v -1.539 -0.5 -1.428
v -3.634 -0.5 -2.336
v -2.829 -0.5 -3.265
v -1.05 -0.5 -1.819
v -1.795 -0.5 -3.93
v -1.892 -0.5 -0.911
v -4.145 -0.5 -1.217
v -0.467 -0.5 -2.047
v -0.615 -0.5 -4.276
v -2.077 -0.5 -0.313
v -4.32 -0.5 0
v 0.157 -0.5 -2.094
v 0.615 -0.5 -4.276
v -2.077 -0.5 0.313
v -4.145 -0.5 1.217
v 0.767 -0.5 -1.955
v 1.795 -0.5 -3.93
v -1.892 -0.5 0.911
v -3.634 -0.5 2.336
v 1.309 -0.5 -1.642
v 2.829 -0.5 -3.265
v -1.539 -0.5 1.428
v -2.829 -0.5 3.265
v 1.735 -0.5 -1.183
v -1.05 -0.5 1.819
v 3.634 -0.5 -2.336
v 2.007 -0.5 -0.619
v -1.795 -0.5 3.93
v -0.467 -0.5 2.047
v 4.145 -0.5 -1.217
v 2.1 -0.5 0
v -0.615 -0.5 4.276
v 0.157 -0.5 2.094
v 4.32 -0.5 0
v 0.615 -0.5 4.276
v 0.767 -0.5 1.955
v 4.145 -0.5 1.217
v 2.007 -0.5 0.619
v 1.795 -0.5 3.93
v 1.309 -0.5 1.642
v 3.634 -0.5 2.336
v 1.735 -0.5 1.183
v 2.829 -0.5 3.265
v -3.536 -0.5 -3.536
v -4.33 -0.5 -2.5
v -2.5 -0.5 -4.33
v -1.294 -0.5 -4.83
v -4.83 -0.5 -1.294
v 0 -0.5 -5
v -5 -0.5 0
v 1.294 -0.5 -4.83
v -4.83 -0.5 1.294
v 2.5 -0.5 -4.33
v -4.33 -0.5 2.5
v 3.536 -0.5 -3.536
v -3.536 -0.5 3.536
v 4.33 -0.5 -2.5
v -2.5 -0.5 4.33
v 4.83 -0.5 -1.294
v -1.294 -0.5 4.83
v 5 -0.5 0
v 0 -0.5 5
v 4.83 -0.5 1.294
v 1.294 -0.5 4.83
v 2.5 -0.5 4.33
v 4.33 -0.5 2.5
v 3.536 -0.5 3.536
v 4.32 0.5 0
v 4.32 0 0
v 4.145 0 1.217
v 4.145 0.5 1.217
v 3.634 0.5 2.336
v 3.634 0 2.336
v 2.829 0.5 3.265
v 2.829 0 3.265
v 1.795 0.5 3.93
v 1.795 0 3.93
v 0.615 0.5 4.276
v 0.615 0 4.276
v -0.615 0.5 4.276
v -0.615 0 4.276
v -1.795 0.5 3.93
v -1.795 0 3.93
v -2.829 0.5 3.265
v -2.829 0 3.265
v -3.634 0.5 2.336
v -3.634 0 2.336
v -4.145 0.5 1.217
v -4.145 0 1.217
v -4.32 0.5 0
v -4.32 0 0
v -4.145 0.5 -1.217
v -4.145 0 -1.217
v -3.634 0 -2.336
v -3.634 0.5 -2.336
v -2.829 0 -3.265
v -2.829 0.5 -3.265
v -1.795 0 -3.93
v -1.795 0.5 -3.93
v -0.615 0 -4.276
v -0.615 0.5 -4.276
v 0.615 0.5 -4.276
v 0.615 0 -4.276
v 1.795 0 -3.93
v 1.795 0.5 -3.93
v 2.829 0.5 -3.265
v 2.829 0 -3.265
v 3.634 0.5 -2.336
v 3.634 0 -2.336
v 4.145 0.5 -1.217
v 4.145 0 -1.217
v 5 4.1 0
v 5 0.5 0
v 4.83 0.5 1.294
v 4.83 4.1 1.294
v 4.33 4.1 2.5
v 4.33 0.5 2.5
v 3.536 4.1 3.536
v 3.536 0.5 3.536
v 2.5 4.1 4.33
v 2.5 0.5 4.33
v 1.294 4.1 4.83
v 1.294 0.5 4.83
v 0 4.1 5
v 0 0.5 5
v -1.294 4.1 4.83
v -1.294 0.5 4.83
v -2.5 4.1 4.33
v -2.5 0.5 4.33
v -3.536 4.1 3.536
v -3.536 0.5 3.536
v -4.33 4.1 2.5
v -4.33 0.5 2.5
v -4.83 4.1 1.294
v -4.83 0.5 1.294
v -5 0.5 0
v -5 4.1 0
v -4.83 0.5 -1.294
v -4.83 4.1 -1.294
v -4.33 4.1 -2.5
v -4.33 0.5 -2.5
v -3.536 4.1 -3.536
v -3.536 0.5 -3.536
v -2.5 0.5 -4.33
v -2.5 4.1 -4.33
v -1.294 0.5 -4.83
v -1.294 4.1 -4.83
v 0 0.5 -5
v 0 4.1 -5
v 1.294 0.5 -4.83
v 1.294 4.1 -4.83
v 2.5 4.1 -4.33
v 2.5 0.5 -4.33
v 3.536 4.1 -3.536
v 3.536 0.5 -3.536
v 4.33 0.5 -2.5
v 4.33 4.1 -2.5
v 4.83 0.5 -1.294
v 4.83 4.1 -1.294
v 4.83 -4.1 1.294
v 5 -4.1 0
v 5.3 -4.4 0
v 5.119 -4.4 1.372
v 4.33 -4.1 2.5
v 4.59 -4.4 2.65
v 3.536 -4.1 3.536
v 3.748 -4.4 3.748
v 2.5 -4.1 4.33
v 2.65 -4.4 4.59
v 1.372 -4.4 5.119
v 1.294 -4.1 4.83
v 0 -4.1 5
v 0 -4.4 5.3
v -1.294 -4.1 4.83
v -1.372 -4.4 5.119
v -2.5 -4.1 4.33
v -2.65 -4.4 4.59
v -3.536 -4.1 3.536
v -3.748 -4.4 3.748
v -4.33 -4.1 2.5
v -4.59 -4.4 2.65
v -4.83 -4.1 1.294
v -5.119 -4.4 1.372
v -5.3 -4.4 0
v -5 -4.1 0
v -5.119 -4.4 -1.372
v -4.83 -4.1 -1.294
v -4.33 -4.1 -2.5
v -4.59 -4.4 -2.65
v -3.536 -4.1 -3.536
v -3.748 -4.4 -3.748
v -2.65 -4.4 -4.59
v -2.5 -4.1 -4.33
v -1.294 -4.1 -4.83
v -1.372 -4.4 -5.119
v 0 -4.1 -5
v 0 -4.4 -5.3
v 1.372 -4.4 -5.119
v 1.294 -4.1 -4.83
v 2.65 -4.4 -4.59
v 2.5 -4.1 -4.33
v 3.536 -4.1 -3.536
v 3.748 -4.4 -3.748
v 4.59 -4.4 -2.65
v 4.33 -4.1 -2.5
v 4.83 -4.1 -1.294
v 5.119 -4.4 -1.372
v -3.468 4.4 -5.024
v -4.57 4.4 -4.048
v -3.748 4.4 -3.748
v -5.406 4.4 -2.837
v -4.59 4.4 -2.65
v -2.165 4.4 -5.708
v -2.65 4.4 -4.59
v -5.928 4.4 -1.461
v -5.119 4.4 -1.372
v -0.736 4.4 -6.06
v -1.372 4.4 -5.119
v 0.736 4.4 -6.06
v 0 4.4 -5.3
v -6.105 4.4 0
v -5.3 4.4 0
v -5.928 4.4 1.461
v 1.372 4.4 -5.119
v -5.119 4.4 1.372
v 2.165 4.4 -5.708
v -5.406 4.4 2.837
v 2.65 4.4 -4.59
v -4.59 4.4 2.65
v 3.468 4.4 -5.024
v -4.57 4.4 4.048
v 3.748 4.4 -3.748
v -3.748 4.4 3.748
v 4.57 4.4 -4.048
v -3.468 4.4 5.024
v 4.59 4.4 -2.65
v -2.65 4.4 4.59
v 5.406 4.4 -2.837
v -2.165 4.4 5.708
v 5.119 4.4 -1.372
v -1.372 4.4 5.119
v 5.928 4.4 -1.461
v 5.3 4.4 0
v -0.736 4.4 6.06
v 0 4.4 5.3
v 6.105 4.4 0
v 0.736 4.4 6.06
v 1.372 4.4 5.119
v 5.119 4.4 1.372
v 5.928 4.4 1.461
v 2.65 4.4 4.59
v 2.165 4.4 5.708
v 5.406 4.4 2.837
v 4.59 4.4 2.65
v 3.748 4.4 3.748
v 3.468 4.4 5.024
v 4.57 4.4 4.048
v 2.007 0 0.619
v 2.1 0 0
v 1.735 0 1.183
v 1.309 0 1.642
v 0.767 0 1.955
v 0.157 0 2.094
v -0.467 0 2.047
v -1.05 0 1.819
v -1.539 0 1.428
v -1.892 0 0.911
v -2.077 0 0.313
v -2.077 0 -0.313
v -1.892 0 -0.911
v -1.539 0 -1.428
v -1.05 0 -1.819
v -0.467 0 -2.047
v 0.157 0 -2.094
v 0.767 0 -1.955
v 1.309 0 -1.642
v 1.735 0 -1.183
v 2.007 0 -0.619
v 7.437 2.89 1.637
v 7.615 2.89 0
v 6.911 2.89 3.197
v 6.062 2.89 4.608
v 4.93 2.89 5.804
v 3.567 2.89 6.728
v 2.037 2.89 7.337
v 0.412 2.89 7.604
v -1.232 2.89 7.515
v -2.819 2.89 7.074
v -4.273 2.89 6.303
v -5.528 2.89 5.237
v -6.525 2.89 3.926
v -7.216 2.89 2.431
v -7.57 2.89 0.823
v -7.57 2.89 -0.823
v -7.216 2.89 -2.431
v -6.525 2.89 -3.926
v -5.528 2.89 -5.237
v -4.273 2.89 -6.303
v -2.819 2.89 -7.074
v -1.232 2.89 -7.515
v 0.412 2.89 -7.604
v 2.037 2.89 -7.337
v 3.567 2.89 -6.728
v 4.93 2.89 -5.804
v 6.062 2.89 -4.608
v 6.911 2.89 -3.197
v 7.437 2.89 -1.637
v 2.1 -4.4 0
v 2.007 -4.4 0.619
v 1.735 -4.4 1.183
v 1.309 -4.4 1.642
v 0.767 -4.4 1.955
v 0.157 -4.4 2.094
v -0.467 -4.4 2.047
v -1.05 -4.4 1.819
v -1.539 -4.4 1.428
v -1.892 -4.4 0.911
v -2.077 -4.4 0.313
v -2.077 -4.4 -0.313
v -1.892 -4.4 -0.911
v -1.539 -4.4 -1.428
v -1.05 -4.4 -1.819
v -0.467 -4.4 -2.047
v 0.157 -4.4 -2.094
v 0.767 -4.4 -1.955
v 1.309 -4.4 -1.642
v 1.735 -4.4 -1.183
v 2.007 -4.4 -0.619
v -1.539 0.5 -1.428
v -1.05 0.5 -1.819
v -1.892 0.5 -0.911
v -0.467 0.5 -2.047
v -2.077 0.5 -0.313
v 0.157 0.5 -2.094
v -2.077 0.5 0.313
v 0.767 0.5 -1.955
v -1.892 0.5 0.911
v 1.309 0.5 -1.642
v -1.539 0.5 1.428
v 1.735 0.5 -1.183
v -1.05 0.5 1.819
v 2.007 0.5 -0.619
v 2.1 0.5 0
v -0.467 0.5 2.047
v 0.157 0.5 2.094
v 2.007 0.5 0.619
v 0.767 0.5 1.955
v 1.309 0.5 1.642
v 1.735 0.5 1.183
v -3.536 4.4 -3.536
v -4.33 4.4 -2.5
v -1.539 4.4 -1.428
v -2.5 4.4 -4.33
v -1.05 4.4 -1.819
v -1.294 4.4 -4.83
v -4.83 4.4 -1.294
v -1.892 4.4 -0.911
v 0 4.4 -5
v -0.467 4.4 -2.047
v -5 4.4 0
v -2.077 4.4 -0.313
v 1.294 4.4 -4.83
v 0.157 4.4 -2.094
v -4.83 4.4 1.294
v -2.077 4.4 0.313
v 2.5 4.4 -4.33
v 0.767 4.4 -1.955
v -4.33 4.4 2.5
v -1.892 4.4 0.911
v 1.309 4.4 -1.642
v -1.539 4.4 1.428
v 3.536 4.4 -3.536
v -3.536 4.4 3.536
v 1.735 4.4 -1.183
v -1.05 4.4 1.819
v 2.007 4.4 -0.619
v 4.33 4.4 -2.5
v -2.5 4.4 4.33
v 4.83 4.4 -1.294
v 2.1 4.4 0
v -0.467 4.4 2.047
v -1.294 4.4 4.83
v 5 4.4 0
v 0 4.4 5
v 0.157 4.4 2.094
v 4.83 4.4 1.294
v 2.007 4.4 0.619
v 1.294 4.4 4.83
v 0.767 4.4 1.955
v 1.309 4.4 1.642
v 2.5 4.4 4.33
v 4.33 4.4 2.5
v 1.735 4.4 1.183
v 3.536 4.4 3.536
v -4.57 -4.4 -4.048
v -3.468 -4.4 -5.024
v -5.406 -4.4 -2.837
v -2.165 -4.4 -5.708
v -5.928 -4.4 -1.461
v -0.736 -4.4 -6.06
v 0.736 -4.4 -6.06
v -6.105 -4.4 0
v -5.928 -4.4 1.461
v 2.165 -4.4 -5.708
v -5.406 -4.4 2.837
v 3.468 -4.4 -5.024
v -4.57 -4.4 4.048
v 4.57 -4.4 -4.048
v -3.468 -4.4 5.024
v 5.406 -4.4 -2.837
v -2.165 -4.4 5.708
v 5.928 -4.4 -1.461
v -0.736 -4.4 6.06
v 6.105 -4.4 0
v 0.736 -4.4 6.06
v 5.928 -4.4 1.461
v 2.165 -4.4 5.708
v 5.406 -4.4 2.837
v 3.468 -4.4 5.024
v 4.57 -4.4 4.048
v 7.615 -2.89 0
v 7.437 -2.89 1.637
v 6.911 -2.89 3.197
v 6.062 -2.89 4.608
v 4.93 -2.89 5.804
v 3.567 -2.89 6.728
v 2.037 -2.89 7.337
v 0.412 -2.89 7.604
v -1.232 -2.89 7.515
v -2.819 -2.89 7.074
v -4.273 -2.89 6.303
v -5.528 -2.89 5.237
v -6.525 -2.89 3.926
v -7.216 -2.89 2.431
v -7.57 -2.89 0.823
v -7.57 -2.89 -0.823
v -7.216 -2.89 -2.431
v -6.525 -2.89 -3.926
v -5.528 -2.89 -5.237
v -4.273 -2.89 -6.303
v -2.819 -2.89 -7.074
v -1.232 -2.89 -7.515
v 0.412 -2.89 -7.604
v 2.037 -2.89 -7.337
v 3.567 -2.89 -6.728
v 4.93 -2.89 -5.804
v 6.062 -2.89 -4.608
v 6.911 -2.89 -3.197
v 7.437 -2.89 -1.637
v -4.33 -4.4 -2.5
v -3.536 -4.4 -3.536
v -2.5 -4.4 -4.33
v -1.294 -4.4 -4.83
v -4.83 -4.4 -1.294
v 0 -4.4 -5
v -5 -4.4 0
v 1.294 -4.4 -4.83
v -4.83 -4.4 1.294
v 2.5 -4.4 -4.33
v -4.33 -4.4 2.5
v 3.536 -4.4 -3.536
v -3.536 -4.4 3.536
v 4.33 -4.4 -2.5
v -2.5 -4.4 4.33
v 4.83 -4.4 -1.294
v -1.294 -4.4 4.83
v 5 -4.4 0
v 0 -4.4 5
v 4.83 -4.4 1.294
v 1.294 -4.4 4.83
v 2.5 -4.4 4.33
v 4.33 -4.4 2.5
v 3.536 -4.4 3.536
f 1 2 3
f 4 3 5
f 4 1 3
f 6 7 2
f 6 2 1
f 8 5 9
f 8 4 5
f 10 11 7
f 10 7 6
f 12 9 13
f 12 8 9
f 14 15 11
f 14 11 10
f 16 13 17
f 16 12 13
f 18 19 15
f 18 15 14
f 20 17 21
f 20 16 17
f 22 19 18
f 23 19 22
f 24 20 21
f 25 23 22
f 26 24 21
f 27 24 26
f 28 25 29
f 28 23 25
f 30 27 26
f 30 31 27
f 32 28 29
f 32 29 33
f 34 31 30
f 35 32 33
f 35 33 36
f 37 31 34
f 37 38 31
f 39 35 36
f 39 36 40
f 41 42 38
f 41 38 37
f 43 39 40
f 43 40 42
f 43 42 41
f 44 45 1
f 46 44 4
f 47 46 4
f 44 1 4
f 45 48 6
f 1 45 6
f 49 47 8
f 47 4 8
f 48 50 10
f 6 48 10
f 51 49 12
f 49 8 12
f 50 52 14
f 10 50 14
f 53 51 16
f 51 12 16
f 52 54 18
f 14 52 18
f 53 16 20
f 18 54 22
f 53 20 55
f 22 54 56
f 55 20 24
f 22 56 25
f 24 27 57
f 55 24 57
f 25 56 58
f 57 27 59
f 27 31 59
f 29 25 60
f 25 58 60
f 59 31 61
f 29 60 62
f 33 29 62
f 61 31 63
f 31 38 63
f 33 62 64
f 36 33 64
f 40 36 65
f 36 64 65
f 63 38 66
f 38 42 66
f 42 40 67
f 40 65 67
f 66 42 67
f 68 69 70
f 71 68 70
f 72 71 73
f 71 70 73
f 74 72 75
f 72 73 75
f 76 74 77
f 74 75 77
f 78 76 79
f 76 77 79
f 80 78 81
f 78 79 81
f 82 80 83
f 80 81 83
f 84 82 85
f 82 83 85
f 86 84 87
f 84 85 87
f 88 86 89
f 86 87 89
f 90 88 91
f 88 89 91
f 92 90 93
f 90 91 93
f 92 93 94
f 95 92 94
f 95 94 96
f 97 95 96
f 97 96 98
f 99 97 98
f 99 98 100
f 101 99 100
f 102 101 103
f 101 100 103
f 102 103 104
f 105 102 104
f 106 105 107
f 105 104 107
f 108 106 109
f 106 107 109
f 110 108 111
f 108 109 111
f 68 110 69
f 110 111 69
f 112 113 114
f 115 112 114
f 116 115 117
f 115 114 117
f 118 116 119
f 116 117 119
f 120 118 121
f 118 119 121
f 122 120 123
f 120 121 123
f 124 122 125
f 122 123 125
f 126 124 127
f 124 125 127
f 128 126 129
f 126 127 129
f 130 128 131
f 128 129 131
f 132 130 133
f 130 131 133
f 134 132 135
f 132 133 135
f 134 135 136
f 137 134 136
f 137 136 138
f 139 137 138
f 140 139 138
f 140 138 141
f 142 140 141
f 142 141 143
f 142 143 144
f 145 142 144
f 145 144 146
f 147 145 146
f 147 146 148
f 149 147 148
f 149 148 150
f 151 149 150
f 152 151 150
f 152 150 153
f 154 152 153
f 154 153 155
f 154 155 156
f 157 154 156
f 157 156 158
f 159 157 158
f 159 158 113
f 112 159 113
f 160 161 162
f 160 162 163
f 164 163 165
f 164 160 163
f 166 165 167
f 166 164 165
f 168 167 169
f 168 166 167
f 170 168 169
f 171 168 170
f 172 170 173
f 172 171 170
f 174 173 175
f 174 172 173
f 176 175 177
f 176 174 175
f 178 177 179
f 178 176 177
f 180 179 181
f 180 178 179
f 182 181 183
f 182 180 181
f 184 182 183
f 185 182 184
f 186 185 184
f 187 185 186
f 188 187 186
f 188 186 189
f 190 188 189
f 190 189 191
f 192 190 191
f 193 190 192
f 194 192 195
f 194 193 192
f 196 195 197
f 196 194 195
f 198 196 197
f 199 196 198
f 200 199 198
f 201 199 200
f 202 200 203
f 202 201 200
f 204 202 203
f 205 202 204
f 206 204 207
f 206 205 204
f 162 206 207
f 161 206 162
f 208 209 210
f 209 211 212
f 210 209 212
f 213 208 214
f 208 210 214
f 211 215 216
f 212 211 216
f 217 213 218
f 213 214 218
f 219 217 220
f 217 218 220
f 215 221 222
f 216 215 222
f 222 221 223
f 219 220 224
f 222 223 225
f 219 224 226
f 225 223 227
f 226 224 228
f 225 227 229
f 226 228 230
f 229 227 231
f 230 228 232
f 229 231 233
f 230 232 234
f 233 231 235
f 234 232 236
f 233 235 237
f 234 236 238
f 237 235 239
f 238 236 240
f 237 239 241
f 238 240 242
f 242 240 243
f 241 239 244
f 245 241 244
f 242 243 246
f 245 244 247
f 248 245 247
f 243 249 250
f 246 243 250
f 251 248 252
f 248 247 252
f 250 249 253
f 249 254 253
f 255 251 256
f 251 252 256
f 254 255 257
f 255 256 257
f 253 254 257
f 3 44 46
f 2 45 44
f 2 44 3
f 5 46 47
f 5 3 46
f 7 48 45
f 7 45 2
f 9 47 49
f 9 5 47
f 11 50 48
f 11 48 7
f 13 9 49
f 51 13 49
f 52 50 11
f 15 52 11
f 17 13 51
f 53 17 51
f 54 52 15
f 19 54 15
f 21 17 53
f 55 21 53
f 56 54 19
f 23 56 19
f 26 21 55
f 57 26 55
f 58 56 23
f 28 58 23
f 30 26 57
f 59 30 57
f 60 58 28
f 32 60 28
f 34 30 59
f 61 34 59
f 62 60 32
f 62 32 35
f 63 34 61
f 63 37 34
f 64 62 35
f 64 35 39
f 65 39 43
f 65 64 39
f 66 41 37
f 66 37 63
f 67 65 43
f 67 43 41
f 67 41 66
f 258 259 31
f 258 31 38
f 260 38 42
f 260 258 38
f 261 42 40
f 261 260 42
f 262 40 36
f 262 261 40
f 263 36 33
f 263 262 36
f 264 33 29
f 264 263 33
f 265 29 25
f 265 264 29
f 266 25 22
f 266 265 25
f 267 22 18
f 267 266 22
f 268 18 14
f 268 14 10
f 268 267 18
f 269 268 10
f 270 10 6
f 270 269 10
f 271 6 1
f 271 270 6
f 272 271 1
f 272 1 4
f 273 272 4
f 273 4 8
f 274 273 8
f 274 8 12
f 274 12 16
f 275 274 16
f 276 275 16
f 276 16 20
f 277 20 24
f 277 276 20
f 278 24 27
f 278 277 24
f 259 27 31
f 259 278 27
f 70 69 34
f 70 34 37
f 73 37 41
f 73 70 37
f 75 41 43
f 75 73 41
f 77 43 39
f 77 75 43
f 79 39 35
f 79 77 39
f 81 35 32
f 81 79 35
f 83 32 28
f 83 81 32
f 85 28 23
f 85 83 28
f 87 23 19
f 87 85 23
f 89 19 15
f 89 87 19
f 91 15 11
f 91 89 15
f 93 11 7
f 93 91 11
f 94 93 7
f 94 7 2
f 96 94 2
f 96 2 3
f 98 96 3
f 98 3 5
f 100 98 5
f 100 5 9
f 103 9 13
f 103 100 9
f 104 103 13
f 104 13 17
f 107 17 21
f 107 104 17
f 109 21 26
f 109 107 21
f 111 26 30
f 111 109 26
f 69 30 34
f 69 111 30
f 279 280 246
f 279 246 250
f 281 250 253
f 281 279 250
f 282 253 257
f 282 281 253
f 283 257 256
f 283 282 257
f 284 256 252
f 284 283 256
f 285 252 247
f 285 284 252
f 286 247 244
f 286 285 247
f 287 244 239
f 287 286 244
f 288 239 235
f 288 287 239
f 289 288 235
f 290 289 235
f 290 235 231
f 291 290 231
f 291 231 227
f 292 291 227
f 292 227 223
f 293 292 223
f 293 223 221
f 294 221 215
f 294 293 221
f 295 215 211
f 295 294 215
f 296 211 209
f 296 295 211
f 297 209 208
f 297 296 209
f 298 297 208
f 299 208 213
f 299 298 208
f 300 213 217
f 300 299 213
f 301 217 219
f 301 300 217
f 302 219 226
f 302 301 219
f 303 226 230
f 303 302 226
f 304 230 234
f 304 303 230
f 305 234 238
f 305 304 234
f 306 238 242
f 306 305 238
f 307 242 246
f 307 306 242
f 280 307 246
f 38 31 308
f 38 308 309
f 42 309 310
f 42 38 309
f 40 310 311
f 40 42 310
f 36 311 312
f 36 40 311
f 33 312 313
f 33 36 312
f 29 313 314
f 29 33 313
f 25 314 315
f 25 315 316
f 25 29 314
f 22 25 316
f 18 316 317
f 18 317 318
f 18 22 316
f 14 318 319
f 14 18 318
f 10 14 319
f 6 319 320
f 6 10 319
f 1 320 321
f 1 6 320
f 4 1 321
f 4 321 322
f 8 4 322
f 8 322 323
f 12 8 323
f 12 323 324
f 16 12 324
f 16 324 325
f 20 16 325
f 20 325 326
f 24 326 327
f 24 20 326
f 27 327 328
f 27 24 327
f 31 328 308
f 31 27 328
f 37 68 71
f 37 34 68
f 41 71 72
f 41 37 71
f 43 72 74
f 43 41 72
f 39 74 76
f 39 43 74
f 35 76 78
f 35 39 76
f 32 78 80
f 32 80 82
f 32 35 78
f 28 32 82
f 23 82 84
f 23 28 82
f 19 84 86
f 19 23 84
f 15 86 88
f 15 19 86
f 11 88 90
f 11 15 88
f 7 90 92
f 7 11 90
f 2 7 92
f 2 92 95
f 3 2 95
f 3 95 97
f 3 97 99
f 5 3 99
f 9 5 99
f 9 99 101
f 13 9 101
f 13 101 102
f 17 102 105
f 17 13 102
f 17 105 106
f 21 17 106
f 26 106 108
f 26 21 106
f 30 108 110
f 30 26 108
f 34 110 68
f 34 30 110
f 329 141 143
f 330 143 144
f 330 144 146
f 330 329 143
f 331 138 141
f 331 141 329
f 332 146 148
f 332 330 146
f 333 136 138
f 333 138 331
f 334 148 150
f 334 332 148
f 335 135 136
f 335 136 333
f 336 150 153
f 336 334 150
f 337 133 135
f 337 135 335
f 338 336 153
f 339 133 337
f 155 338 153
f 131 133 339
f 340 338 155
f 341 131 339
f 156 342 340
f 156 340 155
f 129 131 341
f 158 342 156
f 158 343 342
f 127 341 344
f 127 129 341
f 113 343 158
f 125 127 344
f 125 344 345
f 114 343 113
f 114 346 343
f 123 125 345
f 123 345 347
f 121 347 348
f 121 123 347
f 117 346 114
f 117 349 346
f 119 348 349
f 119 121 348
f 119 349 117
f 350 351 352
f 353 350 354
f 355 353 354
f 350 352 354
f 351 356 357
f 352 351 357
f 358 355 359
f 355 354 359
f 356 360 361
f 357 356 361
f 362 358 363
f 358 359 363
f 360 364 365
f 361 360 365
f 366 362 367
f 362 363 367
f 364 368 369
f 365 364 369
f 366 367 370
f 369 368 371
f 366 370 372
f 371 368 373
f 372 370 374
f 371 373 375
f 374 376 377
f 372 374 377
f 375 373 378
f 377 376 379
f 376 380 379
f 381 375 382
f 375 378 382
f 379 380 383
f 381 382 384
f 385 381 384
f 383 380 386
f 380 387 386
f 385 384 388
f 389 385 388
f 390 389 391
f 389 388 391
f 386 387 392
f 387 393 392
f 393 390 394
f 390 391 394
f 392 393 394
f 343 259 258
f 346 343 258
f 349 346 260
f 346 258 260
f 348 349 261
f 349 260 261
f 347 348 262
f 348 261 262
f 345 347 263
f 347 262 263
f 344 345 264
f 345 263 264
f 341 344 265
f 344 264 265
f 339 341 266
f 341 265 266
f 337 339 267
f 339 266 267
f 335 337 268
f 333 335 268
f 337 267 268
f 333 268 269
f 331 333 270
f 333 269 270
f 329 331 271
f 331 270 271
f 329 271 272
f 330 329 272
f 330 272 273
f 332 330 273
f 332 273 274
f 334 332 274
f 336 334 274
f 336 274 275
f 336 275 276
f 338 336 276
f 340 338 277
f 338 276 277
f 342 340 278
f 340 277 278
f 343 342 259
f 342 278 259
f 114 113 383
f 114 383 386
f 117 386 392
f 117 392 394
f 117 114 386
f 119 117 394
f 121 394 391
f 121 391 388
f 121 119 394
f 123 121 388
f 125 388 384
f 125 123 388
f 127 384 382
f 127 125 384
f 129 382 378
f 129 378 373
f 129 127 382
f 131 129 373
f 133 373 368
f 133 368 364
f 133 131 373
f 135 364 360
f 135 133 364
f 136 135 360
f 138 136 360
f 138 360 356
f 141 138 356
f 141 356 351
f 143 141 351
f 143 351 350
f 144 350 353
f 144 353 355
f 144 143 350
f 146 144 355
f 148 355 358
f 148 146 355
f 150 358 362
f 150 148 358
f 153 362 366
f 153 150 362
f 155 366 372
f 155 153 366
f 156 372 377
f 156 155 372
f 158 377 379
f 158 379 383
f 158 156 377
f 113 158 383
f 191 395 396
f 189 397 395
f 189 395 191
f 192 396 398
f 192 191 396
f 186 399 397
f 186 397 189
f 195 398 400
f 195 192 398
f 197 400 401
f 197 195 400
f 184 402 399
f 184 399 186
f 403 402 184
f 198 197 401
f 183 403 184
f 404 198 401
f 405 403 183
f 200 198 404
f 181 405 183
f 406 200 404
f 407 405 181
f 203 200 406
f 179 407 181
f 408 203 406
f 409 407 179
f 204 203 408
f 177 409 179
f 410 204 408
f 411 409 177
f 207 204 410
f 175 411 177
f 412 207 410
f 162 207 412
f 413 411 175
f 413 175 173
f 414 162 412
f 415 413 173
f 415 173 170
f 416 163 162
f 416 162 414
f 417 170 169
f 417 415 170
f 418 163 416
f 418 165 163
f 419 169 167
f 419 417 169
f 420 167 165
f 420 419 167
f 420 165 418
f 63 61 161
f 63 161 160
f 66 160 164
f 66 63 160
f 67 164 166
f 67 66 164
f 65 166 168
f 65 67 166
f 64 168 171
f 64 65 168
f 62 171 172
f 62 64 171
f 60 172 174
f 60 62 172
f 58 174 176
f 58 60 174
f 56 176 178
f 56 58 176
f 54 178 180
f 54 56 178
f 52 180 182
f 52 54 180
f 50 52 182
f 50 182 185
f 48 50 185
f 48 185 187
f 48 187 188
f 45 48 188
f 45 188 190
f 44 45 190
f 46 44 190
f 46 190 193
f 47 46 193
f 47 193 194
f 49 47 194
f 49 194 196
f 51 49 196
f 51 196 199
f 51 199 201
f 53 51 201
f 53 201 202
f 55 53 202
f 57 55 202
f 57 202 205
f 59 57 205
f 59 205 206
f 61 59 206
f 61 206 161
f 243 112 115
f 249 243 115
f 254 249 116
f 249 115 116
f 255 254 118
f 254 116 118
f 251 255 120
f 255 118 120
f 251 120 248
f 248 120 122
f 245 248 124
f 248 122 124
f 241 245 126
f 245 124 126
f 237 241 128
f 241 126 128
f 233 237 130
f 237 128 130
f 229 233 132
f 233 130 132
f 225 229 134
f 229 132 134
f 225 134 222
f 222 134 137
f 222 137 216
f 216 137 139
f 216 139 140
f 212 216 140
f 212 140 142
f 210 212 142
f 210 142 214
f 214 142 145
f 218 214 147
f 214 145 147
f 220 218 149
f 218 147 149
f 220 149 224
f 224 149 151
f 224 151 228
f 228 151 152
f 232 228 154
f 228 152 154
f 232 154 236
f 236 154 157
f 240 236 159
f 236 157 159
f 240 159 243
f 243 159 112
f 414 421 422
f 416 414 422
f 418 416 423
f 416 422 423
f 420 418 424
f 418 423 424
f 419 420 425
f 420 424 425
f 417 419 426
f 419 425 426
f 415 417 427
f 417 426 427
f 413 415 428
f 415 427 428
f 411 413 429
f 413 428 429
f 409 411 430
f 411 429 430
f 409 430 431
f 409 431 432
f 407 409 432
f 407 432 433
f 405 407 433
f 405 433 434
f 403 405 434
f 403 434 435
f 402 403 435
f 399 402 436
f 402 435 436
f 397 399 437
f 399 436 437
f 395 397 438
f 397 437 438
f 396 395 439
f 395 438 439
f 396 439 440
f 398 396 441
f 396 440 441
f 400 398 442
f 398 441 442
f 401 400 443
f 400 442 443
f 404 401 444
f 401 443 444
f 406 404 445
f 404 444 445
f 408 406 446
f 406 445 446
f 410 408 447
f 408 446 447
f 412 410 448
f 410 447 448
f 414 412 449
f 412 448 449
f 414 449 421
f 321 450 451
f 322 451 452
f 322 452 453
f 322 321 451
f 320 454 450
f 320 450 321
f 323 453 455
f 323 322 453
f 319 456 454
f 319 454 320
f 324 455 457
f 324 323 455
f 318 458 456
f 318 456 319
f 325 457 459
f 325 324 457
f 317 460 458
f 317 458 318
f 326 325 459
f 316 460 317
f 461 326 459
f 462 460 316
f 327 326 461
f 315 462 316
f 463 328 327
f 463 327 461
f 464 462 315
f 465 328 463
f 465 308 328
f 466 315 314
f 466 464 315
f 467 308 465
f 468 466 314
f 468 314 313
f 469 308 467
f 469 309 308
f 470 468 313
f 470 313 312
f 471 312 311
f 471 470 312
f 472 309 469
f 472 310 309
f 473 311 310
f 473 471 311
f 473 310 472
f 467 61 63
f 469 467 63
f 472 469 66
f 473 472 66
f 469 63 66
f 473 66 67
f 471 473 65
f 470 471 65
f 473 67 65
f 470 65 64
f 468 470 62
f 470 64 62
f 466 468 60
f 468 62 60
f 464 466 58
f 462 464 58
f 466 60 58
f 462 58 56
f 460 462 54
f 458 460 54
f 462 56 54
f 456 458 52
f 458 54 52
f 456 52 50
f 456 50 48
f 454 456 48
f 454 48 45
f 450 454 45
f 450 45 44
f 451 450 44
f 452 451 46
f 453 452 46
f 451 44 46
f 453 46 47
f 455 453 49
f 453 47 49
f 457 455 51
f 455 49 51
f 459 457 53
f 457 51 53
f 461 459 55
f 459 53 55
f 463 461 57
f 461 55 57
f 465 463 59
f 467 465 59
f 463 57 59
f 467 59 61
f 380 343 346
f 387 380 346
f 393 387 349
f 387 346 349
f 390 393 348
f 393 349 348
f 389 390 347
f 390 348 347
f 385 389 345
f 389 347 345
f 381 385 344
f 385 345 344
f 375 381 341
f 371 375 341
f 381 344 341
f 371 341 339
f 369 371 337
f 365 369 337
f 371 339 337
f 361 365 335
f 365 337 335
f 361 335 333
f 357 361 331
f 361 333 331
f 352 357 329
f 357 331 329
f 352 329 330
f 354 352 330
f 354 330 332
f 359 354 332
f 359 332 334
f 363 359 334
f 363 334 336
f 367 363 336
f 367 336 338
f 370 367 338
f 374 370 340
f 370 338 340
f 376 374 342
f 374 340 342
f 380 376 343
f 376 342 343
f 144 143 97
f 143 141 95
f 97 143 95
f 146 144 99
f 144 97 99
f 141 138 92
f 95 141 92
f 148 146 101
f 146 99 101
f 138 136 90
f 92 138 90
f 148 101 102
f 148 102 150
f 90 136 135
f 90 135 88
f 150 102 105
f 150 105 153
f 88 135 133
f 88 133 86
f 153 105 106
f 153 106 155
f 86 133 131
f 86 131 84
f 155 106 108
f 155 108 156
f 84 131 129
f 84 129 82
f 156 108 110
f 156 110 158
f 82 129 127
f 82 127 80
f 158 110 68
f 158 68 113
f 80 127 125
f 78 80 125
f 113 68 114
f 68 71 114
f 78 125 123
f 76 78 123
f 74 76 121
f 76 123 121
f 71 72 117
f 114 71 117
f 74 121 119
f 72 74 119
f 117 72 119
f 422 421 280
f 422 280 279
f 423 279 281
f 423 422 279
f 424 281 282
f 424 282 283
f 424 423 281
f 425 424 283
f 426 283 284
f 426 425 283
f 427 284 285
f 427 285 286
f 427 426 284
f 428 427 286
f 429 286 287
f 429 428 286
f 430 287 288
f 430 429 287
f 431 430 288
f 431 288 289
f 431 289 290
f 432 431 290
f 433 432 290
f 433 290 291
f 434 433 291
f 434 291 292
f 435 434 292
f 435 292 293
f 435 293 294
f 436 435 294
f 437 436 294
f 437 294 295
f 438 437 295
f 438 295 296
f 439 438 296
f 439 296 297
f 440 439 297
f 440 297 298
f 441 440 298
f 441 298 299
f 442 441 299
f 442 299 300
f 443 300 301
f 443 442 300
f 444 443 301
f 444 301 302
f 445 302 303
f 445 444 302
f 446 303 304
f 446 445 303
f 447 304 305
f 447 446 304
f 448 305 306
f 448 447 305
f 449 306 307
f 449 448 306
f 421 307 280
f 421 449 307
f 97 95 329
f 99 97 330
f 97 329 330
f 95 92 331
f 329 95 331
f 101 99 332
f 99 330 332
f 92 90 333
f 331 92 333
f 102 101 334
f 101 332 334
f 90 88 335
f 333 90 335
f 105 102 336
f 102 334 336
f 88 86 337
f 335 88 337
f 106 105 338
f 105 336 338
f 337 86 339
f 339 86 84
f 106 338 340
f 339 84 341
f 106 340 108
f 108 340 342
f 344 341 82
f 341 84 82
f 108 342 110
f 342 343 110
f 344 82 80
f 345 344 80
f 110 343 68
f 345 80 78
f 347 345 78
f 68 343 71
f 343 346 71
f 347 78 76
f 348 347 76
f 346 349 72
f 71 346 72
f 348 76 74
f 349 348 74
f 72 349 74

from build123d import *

# Parameters (mm, degrees)
F0_R          = 7.615
F0_R_2        = 5
F1_DEPTH      = 4.4
F1_DEPTH_BACK = 4.4
F0_R_3        = 4.32
F2_DEPTH      = 0.5
F2_DEPTH_BACK = 0.5
F3_SIZE       = 1.51
F4_SIZE       = 0.3
F5_START      = 0.5
F0_R_4        = 2.1
F5_DEPTH      = 3.9
F6_START      = -0.5
F6_DEPTH      = 3.9
F7_DEPTH      = 0.5
F7_DEPTH_BACK = 0.5


with BuildPart() as f1:
    # F0 (on Front) → F1 (new body, two sides)
    with BuildSketch(Plane.XZ) as f1_sk:
        Circle(F0_R)
        Circle(F0_R_2, mode=Mode.SUBTRACT)
    extrude(amount=F1_DEPTH)
    extrude(f1_sk.sketch, amount=-F1_DEPTH_BACK)

    # F0 (on Front) → F2 (join, two sides)
    with BuildSketch(Plane.XZ) as f2_sk:
        Circle(F0_R_2)
        Circle(F0_R_3, mode=Mode.SUBTRACT)
    extrude(amount=F2_DEPTH)
    extrude(f2_sk.sketch, amount=-F2_DEPTH_BACK)

    # F3
    f3_edges = [f1.edges().sort_by_distance(p)[0] for p in [
        (-7.615, 4.4, 0),
        (-7.615, -4.4, 0),
    ]]
    chamfer(f3_edges, length=F3_SIZE)

    # F4
    f4_edges = [f1.edges().sort_by_distance(p)[0] for p in [
        (-5, -4.4, 0),
        (-5, 4.4, 0),
    ]]
    chamfer(f4_edges, length=F4_SIZE)


with BuildPart() as f5:
    # F0 (on Front) → F5 (new body)
    with BuildSketch(Plane.XZ.offset(F5_START)):
        Circle(F0_R_2)
        Circle(F0_R_3, mode=Mode.SUBTRACT)
        Circle(F0_R_3)
        Circle(F0_R_4, mode=Mode.SUBTRACT)
    extrude(amount=F5_DEPTH)


with BuildPart() as f6:
    # F0 (on Front) → F6 (new body)
    with BuildSketch(Plane.XZ.offset(F6_START)):
        Circle(F0_R_2)
        Circle(F0_R_3, mode=Mode.SUBTRACT)
        Circle(F0_R_3)
        Circle(F0_R_4, mode=Mode.SUBTRACT)
    extrude(amount=-F6_DEPTH)


with BuildPart() as f7:
    # F0 (on Front) → F7 (new body, two sides)
    with BuildSketch(Plane.XZ) as f7_sk:
        Circle(F0_R_3)
        Circle(F0_R_4, mode=Mode.SUBTRACT)
    extrude(amount=F7_DEPTH)
    extrude(f7_sk.sketch, amount=-F7_DEPTH_BACK)


solid = Compound([f1.part, f5.part, f6.part, f7.part])
